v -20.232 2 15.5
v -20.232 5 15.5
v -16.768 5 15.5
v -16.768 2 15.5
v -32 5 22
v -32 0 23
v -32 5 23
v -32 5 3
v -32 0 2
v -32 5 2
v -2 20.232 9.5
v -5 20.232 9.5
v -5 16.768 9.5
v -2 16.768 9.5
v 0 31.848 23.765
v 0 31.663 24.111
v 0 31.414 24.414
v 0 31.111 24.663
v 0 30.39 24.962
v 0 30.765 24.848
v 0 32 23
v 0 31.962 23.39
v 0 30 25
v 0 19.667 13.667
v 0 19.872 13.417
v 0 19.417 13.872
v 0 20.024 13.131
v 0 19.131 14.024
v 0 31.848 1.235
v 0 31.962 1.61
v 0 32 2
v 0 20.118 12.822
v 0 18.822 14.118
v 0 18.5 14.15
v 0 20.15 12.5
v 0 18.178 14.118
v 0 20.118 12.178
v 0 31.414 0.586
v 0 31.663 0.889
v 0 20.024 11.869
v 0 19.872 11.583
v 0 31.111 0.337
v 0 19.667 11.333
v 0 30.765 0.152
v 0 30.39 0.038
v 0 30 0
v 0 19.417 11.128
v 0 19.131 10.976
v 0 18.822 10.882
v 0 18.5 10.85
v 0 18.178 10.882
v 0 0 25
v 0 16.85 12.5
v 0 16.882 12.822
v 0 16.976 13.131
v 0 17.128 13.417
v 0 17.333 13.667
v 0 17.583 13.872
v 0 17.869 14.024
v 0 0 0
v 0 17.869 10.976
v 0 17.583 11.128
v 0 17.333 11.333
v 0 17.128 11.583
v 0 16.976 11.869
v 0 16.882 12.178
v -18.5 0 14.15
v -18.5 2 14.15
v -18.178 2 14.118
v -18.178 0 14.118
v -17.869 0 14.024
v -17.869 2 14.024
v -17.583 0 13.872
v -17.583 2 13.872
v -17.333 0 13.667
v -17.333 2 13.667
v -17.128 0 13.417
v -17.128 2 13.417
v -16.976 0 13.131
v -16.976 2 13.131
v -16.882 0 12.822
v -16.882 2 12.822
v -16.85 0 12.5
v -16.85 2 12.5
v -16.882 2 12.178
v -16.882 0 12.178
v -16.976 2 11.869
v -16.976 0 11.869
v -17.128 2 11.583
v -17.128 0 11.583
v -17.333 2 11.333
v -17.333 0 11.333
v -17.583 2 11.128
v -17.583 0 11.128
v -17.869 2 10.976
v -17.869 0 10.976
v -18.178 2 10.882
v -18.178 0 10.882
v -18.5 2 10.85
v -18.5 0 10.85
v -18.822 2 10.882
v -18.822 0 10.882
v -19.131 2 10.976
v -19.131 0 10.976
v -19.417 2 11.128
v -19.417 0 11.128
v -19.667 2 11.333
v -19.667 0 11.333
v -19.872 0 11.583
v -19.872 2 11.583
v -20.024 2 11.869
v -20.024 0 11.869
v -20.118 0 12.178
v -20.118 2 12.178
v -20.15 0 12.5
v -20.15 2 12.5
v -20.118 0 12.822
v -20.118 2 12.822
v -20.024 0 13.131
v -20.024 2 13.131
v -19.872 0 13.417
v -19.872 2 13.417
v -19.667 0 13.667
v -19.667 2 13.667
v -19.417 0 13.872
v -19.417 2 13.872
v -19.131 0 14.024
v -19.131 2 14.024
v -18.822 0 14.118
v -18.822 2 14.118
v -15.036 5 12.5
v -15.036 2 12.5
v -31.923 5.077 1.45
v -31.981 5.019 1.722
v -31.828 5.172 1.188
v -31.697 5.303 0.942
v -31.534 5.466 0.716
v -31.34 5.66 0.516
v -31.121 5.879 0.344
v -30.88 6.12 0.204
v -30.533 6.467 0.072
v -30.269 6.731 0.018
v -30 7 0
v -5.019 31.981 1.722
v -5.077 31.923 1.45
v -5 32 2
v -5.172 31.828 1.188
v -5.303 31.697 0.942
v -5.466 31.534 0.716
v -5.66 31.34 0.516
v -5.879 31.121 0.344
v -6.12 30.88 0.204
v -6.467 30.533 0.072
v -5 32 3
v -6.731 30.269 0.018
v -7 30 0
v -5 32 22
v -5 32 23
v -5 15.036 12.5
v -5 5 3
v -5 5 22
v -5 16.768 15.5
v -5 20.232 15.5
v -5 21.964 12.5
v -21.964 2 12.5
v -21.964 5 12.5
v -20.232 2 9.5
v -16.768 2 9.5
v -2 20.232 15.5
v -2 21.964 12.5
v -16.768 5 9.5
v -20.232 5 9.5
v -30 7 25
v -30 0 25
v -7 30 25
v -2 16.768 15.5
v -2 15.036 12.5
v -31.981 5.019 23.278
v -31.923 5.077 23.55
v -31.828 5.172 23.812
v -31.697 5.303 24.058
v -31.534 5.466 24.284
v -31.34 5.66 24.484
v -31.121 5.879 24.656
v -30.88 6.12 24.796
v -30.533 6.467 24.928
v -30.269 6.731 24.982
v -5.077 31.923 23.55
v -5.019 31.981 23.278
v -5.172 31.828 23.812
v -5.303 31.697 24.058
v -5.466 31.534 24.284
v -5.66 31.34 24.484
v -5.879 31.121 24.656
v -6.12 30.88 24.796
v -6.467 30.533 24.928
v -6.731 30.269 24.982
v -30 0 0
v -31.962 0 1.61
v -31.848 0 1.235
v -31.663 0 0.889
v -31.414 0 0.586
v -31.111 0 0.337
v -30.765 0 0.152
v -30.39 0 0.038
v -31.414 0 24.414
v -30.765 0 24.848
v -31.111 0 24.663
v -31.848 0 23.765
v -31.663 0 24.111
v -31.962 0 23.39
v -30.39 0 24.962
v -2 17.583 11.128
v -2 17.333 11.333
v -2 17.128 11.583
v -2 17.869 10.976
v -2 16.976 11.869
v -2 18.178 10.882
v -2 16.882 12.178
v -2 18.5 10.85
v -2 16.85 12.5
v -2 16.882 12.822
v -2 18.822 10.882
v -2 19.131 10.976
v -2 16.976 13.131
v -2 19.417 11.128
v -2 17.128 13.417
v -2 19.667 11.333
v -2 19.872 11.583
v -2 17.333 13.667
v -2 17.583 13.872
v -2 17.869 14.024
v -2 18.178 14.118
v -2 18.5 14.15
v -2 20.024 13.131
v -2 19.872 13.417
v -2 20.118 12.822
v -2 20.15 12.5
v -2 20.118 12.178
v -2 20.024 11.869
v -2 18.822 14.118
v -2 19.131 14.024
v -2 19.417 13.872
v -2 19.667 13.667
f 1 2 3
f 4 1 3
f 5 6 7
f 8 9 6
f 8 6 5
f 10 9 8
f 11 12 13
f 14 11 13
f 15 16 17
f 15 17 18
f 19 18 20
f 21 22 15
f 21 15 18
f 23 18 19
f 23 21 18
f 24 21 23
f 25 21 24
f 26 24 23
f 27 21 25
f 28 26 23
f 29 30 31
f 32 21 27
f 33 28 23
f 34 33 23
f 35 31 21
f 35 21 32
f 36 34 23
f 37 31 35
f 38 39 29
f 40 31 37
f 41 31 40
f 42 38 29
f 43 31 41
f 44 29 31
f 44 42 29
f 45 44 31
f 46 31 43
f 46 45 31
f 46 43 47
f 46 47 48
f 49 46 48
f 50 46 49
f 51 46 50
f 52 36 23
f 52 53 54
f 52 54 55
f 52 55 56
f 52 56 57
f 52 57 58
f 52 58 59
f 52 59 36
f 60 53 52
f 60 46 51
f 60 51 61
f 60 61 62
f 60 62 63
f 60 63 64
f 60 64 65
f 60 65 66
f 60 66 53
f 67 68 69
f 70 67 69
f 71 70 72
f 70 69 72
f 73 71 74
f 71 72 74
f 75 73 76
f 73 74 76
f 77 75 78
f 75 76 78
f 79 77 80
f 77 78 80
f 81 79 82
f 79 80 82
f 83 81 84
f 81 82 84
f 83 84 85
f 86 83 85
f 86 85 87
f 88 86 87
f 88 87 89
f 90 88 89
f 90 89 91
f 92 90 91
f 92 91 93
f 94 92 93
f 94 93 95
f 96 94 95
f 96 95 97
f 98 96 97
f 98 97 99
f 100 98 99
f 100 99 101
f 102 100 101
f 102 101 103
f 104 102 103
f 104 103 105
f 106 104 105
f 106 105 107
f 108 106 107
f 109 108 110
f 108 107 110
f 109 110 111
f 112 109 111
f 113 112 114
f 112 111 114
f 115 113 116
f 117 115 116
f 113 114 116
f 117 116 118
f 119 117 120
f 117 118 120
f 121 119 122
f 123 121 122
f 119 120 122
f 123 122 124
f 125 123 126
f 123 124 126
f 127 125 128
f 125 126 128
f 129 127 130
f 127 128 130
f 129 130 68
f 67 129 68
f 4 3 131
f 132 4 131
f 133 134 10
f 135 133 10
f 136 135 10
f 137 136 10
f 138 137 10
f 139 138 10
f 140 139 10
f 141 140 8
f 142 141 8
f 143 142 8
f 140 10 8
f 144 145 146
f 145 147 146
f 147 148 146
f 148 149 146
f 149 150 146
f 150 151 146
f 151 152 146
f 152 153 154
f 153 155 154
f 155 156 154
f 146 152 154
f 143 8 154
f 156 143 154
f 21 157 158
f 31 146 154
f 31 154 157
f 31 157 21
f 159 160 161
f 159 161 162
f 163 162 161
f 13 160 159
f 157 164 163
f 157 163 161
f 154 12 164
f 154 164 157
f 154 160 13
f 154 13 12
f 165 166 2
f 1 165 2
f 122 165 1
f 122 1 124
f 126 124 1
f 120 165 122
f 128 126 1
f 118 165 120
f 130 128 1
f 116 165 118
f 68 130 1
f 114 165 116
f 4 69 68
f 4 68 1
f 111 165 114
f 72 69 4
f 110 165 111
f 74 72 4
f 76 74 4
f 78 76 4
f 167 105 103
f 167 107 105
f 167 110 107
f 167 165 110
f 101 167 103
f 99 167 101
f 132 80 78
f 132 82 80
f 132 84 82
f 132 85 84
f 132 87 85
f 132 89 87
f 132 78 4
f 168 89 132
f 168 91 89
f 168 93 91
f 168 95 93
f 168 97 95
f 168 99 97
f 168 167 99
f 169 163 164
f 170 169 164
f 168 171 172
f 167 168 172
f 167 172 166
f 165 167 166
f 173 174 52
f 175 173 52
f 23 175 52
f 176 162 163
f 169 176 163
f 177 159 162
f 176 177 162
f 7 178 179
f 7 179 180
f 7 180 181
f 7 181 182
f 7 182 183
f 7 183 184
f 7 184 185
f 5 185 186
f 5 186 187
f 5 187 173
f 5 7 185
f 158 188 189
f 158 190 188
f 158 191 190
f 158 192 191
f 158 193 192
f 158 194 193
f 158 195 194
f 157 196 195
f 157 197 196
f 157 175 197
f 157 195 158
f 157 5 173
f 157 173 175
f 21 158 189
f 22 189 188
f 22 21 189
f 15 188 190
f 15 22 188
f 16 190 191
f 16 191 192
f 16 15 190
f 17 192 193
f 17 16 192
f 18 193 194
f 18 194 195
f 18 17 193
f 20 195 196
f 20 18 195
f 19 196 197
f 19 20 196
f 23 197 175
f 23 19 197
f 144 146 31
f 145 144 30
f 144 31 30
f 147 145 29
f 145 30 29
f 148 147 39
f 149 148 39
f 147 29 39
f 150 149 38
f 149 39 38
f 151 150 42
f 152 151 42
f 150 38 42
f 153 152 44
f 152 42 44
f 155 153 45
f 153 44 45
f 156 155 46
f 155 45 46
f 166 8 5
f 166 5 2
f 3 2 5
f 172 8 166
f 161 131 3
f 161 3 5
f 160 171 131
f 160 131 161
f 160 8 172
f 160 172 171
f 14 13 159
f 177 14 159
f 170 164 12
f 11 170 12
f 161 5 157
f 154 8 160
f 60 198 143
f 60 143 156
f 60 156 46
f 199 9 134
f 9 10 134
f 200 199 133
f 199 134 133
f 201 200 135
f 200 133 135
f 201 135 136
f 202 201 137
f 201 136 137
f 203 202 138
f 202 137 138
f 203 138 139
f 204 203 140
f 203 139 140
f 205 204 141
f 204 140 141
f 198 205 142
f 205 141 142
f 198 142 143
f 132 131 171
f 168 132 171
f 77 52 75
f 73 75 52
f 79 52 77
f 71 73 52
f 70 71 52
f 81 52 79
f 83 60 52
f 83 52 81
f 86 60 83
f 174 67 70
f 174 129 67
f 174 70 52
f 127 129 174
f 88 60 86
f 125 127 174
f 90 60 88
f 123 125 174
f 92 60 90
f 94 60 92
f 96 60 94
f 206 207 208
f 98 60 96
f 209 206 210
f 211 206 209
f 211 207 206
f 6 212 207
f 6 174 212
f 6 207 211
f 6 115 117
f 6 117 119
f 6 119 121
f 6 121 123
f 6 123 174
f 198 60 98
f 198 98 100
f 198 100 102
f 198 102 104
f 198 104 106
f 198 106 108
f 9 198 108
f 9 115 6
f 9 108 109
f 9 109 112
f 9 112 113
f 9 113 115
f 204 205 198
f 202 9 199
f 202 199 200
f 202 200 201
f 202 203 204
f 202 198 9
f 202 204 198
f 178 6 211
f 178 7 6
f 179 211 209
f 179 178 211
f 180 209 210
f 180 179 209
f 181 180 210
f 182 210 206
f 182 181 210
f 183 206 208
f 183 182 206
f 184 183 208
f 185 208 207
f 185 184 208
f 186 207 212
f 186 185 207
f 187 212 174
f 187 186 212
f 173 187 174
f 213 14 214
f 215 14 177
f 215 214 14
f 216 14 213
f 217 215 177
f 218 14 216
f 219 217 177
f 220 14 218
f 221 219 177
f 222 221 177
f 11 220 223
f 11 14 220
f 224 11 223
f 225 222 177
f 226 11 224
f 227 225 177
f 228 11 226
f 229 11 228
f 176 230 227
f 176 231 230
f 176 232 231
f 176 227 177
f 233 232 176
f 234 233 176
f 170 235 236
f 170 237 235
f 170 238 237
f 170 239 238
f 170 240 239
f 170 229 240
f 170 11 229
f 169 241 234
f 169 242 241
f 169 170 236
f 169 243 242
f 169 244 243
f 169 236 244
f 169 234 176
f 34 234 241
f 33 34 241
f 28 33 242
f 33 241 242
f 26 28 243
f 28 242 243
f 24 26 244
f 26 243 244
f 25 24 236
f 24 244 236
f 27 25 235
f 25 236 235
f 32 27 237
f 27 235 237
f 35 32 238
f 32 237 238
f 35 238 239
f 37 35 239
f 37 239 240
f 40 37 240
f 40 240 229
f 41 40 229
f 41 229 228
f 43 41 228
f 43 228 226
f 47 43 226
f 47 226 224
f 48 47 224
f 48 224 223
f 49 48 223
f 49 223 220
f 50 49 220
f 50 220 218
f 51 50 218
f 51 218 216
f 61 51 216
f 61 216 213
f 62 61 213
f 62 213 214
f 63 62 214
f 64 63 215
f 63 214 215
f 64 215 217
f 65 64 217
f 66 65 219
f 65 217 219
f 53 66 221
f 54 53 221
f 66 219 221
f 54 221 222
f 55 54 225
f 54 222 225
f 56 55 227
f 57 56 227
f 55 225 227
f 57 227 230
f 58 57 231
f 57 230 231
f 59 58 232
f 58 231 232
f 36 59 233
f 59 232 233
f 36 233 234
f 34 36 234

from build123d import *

# Parameters (mm, degrees)
EXTRUDE_1_DEPTH     = 25
RIB_1_REACH         = 53.701
SKETCH_3_WALL_W     = 143.585893822
SKETCH_3_WALL_H     = 3
FILLET_1_R          = 2
CUT_EXTRUDE_1_DEPTH = 3
CUT_EXTRUDE_2_DEPTH = 3
SKETCH_7_R          = 1.65
CUT_EXTRUDE_3_DEPTH = 11
SKETCH_6_R          = 1.65
CUT_EXTRUDE_4_DEPTH = 11


with BuildPart() as part:
    # Эскиз1 → Бобышка-Вытянуть1 (new body)
    with BuildSketch(Plane.XY):
        Polygon((0, 0), (-32, 0), (-32, 5), (-5, 5), (-5, 32), (0, 32), align=None)
    extrude(amount=EXTRUDE_1_DEPTH)

    # Эскиз3 wall → Ребро1 (add, up to next)
    with BuildSketch(Plane(origin=(-18.5, 18.5, 25), x_dir=(0.707106781187, 0.707106781187, 0), z_dir=(-0.707106781187, 0.707106781187, 0)), mode=Mode.PRIVATE) as rib_1_sk1:
        with Locations((0, 1.5)):
            Rectangle(SKETCH_3_WALL_W, SKETCH_3_WALL_H)
    rib_1_tool1 = extrude(rib_1_sk1.sketch, amount=-RIB_1_REACH, mode=Mode.PRIVATE) - part.part
    rib_1 = rib_1_tool1.solids().sort_by_distance((-18.5, 18.5, 25))[0]
    add(rib_1)

    # Зеркальное отражение1: Ребро1 across plane
    add(rib_1.mirror(Plane.XY.offset(12.5)))

    # Скругление1
    fillet_1_edges = [part.edges().sort_by_distance(p)[0] for p in [
        (-32, 2.5, 25),
        (-32, 2.5, 0),
        (-2.5, 32, 0),
        (-2.5, 32, 25),
    ]]
    fillet(fillet_1_edges, radius=FILLET_1_R)

    # Эскиз4 → Вырез-Вытянуть1 (cut)
    with BuildSketch(Plane(origin=(0, 5, 0), x_dir=(1, 0, 0), z_dir=(0, 1, 0))):
        Polygon((-15.035898385, -12.5), (-16.767949192, -9.5), (-20.232050808, -9.5), (-21.964101615, -12.5), (-20.232050808, -15.5), (-16.767949192, -15.5), align=None)
    extrude(amount=-CUT_EXTRUDE_1_DEPTH, mode=Mode.SUBTRACT)

    # Эскиз5 → Вырез-Вытянуть2 (cut)
    with BuildSketch(Plane.ZY.offset(5)):
        Polygon((12.5, 15.035898385), (15.5, 16.767949192), (15.5, 20.232050808), (12.5, 21.964101615), (9.5, 20.232050808), (9.5, 16.767949192), align=None)
    extrude(amount=-CUT_EXTRUDE_2_DEPTH, mode=Mode.SUBTRACT)

    # Эскиз7 → Вырез-Вытянуть3 (cut)
    with BuildSketch(Plane.ZY.offset(2)):
        with Locations((12.5, 18.5)):
            Circle(SKETCH_7_R)
    extrude(amount=-CUT_EXTRUDE_3_DEPTH, mode=Mode.SUBTRACT)

    # Эскиз6 → Вырез-Вытянуть4 (cut)
    with BuildSketch(Plane(origin=(0, 2, 0), x_dir=(1, 0, 0), z_dir=(0, 1, 0))):
        with Locations(Location((-18.5, -12.5, 0), (0, 0, 270))):
            Circle(SKETCH_6_R)
    extrude(amount=-CUT_EXTRUDE_4_DEPTH, mode=Mode.SUBTRACT)


solid = part.part
